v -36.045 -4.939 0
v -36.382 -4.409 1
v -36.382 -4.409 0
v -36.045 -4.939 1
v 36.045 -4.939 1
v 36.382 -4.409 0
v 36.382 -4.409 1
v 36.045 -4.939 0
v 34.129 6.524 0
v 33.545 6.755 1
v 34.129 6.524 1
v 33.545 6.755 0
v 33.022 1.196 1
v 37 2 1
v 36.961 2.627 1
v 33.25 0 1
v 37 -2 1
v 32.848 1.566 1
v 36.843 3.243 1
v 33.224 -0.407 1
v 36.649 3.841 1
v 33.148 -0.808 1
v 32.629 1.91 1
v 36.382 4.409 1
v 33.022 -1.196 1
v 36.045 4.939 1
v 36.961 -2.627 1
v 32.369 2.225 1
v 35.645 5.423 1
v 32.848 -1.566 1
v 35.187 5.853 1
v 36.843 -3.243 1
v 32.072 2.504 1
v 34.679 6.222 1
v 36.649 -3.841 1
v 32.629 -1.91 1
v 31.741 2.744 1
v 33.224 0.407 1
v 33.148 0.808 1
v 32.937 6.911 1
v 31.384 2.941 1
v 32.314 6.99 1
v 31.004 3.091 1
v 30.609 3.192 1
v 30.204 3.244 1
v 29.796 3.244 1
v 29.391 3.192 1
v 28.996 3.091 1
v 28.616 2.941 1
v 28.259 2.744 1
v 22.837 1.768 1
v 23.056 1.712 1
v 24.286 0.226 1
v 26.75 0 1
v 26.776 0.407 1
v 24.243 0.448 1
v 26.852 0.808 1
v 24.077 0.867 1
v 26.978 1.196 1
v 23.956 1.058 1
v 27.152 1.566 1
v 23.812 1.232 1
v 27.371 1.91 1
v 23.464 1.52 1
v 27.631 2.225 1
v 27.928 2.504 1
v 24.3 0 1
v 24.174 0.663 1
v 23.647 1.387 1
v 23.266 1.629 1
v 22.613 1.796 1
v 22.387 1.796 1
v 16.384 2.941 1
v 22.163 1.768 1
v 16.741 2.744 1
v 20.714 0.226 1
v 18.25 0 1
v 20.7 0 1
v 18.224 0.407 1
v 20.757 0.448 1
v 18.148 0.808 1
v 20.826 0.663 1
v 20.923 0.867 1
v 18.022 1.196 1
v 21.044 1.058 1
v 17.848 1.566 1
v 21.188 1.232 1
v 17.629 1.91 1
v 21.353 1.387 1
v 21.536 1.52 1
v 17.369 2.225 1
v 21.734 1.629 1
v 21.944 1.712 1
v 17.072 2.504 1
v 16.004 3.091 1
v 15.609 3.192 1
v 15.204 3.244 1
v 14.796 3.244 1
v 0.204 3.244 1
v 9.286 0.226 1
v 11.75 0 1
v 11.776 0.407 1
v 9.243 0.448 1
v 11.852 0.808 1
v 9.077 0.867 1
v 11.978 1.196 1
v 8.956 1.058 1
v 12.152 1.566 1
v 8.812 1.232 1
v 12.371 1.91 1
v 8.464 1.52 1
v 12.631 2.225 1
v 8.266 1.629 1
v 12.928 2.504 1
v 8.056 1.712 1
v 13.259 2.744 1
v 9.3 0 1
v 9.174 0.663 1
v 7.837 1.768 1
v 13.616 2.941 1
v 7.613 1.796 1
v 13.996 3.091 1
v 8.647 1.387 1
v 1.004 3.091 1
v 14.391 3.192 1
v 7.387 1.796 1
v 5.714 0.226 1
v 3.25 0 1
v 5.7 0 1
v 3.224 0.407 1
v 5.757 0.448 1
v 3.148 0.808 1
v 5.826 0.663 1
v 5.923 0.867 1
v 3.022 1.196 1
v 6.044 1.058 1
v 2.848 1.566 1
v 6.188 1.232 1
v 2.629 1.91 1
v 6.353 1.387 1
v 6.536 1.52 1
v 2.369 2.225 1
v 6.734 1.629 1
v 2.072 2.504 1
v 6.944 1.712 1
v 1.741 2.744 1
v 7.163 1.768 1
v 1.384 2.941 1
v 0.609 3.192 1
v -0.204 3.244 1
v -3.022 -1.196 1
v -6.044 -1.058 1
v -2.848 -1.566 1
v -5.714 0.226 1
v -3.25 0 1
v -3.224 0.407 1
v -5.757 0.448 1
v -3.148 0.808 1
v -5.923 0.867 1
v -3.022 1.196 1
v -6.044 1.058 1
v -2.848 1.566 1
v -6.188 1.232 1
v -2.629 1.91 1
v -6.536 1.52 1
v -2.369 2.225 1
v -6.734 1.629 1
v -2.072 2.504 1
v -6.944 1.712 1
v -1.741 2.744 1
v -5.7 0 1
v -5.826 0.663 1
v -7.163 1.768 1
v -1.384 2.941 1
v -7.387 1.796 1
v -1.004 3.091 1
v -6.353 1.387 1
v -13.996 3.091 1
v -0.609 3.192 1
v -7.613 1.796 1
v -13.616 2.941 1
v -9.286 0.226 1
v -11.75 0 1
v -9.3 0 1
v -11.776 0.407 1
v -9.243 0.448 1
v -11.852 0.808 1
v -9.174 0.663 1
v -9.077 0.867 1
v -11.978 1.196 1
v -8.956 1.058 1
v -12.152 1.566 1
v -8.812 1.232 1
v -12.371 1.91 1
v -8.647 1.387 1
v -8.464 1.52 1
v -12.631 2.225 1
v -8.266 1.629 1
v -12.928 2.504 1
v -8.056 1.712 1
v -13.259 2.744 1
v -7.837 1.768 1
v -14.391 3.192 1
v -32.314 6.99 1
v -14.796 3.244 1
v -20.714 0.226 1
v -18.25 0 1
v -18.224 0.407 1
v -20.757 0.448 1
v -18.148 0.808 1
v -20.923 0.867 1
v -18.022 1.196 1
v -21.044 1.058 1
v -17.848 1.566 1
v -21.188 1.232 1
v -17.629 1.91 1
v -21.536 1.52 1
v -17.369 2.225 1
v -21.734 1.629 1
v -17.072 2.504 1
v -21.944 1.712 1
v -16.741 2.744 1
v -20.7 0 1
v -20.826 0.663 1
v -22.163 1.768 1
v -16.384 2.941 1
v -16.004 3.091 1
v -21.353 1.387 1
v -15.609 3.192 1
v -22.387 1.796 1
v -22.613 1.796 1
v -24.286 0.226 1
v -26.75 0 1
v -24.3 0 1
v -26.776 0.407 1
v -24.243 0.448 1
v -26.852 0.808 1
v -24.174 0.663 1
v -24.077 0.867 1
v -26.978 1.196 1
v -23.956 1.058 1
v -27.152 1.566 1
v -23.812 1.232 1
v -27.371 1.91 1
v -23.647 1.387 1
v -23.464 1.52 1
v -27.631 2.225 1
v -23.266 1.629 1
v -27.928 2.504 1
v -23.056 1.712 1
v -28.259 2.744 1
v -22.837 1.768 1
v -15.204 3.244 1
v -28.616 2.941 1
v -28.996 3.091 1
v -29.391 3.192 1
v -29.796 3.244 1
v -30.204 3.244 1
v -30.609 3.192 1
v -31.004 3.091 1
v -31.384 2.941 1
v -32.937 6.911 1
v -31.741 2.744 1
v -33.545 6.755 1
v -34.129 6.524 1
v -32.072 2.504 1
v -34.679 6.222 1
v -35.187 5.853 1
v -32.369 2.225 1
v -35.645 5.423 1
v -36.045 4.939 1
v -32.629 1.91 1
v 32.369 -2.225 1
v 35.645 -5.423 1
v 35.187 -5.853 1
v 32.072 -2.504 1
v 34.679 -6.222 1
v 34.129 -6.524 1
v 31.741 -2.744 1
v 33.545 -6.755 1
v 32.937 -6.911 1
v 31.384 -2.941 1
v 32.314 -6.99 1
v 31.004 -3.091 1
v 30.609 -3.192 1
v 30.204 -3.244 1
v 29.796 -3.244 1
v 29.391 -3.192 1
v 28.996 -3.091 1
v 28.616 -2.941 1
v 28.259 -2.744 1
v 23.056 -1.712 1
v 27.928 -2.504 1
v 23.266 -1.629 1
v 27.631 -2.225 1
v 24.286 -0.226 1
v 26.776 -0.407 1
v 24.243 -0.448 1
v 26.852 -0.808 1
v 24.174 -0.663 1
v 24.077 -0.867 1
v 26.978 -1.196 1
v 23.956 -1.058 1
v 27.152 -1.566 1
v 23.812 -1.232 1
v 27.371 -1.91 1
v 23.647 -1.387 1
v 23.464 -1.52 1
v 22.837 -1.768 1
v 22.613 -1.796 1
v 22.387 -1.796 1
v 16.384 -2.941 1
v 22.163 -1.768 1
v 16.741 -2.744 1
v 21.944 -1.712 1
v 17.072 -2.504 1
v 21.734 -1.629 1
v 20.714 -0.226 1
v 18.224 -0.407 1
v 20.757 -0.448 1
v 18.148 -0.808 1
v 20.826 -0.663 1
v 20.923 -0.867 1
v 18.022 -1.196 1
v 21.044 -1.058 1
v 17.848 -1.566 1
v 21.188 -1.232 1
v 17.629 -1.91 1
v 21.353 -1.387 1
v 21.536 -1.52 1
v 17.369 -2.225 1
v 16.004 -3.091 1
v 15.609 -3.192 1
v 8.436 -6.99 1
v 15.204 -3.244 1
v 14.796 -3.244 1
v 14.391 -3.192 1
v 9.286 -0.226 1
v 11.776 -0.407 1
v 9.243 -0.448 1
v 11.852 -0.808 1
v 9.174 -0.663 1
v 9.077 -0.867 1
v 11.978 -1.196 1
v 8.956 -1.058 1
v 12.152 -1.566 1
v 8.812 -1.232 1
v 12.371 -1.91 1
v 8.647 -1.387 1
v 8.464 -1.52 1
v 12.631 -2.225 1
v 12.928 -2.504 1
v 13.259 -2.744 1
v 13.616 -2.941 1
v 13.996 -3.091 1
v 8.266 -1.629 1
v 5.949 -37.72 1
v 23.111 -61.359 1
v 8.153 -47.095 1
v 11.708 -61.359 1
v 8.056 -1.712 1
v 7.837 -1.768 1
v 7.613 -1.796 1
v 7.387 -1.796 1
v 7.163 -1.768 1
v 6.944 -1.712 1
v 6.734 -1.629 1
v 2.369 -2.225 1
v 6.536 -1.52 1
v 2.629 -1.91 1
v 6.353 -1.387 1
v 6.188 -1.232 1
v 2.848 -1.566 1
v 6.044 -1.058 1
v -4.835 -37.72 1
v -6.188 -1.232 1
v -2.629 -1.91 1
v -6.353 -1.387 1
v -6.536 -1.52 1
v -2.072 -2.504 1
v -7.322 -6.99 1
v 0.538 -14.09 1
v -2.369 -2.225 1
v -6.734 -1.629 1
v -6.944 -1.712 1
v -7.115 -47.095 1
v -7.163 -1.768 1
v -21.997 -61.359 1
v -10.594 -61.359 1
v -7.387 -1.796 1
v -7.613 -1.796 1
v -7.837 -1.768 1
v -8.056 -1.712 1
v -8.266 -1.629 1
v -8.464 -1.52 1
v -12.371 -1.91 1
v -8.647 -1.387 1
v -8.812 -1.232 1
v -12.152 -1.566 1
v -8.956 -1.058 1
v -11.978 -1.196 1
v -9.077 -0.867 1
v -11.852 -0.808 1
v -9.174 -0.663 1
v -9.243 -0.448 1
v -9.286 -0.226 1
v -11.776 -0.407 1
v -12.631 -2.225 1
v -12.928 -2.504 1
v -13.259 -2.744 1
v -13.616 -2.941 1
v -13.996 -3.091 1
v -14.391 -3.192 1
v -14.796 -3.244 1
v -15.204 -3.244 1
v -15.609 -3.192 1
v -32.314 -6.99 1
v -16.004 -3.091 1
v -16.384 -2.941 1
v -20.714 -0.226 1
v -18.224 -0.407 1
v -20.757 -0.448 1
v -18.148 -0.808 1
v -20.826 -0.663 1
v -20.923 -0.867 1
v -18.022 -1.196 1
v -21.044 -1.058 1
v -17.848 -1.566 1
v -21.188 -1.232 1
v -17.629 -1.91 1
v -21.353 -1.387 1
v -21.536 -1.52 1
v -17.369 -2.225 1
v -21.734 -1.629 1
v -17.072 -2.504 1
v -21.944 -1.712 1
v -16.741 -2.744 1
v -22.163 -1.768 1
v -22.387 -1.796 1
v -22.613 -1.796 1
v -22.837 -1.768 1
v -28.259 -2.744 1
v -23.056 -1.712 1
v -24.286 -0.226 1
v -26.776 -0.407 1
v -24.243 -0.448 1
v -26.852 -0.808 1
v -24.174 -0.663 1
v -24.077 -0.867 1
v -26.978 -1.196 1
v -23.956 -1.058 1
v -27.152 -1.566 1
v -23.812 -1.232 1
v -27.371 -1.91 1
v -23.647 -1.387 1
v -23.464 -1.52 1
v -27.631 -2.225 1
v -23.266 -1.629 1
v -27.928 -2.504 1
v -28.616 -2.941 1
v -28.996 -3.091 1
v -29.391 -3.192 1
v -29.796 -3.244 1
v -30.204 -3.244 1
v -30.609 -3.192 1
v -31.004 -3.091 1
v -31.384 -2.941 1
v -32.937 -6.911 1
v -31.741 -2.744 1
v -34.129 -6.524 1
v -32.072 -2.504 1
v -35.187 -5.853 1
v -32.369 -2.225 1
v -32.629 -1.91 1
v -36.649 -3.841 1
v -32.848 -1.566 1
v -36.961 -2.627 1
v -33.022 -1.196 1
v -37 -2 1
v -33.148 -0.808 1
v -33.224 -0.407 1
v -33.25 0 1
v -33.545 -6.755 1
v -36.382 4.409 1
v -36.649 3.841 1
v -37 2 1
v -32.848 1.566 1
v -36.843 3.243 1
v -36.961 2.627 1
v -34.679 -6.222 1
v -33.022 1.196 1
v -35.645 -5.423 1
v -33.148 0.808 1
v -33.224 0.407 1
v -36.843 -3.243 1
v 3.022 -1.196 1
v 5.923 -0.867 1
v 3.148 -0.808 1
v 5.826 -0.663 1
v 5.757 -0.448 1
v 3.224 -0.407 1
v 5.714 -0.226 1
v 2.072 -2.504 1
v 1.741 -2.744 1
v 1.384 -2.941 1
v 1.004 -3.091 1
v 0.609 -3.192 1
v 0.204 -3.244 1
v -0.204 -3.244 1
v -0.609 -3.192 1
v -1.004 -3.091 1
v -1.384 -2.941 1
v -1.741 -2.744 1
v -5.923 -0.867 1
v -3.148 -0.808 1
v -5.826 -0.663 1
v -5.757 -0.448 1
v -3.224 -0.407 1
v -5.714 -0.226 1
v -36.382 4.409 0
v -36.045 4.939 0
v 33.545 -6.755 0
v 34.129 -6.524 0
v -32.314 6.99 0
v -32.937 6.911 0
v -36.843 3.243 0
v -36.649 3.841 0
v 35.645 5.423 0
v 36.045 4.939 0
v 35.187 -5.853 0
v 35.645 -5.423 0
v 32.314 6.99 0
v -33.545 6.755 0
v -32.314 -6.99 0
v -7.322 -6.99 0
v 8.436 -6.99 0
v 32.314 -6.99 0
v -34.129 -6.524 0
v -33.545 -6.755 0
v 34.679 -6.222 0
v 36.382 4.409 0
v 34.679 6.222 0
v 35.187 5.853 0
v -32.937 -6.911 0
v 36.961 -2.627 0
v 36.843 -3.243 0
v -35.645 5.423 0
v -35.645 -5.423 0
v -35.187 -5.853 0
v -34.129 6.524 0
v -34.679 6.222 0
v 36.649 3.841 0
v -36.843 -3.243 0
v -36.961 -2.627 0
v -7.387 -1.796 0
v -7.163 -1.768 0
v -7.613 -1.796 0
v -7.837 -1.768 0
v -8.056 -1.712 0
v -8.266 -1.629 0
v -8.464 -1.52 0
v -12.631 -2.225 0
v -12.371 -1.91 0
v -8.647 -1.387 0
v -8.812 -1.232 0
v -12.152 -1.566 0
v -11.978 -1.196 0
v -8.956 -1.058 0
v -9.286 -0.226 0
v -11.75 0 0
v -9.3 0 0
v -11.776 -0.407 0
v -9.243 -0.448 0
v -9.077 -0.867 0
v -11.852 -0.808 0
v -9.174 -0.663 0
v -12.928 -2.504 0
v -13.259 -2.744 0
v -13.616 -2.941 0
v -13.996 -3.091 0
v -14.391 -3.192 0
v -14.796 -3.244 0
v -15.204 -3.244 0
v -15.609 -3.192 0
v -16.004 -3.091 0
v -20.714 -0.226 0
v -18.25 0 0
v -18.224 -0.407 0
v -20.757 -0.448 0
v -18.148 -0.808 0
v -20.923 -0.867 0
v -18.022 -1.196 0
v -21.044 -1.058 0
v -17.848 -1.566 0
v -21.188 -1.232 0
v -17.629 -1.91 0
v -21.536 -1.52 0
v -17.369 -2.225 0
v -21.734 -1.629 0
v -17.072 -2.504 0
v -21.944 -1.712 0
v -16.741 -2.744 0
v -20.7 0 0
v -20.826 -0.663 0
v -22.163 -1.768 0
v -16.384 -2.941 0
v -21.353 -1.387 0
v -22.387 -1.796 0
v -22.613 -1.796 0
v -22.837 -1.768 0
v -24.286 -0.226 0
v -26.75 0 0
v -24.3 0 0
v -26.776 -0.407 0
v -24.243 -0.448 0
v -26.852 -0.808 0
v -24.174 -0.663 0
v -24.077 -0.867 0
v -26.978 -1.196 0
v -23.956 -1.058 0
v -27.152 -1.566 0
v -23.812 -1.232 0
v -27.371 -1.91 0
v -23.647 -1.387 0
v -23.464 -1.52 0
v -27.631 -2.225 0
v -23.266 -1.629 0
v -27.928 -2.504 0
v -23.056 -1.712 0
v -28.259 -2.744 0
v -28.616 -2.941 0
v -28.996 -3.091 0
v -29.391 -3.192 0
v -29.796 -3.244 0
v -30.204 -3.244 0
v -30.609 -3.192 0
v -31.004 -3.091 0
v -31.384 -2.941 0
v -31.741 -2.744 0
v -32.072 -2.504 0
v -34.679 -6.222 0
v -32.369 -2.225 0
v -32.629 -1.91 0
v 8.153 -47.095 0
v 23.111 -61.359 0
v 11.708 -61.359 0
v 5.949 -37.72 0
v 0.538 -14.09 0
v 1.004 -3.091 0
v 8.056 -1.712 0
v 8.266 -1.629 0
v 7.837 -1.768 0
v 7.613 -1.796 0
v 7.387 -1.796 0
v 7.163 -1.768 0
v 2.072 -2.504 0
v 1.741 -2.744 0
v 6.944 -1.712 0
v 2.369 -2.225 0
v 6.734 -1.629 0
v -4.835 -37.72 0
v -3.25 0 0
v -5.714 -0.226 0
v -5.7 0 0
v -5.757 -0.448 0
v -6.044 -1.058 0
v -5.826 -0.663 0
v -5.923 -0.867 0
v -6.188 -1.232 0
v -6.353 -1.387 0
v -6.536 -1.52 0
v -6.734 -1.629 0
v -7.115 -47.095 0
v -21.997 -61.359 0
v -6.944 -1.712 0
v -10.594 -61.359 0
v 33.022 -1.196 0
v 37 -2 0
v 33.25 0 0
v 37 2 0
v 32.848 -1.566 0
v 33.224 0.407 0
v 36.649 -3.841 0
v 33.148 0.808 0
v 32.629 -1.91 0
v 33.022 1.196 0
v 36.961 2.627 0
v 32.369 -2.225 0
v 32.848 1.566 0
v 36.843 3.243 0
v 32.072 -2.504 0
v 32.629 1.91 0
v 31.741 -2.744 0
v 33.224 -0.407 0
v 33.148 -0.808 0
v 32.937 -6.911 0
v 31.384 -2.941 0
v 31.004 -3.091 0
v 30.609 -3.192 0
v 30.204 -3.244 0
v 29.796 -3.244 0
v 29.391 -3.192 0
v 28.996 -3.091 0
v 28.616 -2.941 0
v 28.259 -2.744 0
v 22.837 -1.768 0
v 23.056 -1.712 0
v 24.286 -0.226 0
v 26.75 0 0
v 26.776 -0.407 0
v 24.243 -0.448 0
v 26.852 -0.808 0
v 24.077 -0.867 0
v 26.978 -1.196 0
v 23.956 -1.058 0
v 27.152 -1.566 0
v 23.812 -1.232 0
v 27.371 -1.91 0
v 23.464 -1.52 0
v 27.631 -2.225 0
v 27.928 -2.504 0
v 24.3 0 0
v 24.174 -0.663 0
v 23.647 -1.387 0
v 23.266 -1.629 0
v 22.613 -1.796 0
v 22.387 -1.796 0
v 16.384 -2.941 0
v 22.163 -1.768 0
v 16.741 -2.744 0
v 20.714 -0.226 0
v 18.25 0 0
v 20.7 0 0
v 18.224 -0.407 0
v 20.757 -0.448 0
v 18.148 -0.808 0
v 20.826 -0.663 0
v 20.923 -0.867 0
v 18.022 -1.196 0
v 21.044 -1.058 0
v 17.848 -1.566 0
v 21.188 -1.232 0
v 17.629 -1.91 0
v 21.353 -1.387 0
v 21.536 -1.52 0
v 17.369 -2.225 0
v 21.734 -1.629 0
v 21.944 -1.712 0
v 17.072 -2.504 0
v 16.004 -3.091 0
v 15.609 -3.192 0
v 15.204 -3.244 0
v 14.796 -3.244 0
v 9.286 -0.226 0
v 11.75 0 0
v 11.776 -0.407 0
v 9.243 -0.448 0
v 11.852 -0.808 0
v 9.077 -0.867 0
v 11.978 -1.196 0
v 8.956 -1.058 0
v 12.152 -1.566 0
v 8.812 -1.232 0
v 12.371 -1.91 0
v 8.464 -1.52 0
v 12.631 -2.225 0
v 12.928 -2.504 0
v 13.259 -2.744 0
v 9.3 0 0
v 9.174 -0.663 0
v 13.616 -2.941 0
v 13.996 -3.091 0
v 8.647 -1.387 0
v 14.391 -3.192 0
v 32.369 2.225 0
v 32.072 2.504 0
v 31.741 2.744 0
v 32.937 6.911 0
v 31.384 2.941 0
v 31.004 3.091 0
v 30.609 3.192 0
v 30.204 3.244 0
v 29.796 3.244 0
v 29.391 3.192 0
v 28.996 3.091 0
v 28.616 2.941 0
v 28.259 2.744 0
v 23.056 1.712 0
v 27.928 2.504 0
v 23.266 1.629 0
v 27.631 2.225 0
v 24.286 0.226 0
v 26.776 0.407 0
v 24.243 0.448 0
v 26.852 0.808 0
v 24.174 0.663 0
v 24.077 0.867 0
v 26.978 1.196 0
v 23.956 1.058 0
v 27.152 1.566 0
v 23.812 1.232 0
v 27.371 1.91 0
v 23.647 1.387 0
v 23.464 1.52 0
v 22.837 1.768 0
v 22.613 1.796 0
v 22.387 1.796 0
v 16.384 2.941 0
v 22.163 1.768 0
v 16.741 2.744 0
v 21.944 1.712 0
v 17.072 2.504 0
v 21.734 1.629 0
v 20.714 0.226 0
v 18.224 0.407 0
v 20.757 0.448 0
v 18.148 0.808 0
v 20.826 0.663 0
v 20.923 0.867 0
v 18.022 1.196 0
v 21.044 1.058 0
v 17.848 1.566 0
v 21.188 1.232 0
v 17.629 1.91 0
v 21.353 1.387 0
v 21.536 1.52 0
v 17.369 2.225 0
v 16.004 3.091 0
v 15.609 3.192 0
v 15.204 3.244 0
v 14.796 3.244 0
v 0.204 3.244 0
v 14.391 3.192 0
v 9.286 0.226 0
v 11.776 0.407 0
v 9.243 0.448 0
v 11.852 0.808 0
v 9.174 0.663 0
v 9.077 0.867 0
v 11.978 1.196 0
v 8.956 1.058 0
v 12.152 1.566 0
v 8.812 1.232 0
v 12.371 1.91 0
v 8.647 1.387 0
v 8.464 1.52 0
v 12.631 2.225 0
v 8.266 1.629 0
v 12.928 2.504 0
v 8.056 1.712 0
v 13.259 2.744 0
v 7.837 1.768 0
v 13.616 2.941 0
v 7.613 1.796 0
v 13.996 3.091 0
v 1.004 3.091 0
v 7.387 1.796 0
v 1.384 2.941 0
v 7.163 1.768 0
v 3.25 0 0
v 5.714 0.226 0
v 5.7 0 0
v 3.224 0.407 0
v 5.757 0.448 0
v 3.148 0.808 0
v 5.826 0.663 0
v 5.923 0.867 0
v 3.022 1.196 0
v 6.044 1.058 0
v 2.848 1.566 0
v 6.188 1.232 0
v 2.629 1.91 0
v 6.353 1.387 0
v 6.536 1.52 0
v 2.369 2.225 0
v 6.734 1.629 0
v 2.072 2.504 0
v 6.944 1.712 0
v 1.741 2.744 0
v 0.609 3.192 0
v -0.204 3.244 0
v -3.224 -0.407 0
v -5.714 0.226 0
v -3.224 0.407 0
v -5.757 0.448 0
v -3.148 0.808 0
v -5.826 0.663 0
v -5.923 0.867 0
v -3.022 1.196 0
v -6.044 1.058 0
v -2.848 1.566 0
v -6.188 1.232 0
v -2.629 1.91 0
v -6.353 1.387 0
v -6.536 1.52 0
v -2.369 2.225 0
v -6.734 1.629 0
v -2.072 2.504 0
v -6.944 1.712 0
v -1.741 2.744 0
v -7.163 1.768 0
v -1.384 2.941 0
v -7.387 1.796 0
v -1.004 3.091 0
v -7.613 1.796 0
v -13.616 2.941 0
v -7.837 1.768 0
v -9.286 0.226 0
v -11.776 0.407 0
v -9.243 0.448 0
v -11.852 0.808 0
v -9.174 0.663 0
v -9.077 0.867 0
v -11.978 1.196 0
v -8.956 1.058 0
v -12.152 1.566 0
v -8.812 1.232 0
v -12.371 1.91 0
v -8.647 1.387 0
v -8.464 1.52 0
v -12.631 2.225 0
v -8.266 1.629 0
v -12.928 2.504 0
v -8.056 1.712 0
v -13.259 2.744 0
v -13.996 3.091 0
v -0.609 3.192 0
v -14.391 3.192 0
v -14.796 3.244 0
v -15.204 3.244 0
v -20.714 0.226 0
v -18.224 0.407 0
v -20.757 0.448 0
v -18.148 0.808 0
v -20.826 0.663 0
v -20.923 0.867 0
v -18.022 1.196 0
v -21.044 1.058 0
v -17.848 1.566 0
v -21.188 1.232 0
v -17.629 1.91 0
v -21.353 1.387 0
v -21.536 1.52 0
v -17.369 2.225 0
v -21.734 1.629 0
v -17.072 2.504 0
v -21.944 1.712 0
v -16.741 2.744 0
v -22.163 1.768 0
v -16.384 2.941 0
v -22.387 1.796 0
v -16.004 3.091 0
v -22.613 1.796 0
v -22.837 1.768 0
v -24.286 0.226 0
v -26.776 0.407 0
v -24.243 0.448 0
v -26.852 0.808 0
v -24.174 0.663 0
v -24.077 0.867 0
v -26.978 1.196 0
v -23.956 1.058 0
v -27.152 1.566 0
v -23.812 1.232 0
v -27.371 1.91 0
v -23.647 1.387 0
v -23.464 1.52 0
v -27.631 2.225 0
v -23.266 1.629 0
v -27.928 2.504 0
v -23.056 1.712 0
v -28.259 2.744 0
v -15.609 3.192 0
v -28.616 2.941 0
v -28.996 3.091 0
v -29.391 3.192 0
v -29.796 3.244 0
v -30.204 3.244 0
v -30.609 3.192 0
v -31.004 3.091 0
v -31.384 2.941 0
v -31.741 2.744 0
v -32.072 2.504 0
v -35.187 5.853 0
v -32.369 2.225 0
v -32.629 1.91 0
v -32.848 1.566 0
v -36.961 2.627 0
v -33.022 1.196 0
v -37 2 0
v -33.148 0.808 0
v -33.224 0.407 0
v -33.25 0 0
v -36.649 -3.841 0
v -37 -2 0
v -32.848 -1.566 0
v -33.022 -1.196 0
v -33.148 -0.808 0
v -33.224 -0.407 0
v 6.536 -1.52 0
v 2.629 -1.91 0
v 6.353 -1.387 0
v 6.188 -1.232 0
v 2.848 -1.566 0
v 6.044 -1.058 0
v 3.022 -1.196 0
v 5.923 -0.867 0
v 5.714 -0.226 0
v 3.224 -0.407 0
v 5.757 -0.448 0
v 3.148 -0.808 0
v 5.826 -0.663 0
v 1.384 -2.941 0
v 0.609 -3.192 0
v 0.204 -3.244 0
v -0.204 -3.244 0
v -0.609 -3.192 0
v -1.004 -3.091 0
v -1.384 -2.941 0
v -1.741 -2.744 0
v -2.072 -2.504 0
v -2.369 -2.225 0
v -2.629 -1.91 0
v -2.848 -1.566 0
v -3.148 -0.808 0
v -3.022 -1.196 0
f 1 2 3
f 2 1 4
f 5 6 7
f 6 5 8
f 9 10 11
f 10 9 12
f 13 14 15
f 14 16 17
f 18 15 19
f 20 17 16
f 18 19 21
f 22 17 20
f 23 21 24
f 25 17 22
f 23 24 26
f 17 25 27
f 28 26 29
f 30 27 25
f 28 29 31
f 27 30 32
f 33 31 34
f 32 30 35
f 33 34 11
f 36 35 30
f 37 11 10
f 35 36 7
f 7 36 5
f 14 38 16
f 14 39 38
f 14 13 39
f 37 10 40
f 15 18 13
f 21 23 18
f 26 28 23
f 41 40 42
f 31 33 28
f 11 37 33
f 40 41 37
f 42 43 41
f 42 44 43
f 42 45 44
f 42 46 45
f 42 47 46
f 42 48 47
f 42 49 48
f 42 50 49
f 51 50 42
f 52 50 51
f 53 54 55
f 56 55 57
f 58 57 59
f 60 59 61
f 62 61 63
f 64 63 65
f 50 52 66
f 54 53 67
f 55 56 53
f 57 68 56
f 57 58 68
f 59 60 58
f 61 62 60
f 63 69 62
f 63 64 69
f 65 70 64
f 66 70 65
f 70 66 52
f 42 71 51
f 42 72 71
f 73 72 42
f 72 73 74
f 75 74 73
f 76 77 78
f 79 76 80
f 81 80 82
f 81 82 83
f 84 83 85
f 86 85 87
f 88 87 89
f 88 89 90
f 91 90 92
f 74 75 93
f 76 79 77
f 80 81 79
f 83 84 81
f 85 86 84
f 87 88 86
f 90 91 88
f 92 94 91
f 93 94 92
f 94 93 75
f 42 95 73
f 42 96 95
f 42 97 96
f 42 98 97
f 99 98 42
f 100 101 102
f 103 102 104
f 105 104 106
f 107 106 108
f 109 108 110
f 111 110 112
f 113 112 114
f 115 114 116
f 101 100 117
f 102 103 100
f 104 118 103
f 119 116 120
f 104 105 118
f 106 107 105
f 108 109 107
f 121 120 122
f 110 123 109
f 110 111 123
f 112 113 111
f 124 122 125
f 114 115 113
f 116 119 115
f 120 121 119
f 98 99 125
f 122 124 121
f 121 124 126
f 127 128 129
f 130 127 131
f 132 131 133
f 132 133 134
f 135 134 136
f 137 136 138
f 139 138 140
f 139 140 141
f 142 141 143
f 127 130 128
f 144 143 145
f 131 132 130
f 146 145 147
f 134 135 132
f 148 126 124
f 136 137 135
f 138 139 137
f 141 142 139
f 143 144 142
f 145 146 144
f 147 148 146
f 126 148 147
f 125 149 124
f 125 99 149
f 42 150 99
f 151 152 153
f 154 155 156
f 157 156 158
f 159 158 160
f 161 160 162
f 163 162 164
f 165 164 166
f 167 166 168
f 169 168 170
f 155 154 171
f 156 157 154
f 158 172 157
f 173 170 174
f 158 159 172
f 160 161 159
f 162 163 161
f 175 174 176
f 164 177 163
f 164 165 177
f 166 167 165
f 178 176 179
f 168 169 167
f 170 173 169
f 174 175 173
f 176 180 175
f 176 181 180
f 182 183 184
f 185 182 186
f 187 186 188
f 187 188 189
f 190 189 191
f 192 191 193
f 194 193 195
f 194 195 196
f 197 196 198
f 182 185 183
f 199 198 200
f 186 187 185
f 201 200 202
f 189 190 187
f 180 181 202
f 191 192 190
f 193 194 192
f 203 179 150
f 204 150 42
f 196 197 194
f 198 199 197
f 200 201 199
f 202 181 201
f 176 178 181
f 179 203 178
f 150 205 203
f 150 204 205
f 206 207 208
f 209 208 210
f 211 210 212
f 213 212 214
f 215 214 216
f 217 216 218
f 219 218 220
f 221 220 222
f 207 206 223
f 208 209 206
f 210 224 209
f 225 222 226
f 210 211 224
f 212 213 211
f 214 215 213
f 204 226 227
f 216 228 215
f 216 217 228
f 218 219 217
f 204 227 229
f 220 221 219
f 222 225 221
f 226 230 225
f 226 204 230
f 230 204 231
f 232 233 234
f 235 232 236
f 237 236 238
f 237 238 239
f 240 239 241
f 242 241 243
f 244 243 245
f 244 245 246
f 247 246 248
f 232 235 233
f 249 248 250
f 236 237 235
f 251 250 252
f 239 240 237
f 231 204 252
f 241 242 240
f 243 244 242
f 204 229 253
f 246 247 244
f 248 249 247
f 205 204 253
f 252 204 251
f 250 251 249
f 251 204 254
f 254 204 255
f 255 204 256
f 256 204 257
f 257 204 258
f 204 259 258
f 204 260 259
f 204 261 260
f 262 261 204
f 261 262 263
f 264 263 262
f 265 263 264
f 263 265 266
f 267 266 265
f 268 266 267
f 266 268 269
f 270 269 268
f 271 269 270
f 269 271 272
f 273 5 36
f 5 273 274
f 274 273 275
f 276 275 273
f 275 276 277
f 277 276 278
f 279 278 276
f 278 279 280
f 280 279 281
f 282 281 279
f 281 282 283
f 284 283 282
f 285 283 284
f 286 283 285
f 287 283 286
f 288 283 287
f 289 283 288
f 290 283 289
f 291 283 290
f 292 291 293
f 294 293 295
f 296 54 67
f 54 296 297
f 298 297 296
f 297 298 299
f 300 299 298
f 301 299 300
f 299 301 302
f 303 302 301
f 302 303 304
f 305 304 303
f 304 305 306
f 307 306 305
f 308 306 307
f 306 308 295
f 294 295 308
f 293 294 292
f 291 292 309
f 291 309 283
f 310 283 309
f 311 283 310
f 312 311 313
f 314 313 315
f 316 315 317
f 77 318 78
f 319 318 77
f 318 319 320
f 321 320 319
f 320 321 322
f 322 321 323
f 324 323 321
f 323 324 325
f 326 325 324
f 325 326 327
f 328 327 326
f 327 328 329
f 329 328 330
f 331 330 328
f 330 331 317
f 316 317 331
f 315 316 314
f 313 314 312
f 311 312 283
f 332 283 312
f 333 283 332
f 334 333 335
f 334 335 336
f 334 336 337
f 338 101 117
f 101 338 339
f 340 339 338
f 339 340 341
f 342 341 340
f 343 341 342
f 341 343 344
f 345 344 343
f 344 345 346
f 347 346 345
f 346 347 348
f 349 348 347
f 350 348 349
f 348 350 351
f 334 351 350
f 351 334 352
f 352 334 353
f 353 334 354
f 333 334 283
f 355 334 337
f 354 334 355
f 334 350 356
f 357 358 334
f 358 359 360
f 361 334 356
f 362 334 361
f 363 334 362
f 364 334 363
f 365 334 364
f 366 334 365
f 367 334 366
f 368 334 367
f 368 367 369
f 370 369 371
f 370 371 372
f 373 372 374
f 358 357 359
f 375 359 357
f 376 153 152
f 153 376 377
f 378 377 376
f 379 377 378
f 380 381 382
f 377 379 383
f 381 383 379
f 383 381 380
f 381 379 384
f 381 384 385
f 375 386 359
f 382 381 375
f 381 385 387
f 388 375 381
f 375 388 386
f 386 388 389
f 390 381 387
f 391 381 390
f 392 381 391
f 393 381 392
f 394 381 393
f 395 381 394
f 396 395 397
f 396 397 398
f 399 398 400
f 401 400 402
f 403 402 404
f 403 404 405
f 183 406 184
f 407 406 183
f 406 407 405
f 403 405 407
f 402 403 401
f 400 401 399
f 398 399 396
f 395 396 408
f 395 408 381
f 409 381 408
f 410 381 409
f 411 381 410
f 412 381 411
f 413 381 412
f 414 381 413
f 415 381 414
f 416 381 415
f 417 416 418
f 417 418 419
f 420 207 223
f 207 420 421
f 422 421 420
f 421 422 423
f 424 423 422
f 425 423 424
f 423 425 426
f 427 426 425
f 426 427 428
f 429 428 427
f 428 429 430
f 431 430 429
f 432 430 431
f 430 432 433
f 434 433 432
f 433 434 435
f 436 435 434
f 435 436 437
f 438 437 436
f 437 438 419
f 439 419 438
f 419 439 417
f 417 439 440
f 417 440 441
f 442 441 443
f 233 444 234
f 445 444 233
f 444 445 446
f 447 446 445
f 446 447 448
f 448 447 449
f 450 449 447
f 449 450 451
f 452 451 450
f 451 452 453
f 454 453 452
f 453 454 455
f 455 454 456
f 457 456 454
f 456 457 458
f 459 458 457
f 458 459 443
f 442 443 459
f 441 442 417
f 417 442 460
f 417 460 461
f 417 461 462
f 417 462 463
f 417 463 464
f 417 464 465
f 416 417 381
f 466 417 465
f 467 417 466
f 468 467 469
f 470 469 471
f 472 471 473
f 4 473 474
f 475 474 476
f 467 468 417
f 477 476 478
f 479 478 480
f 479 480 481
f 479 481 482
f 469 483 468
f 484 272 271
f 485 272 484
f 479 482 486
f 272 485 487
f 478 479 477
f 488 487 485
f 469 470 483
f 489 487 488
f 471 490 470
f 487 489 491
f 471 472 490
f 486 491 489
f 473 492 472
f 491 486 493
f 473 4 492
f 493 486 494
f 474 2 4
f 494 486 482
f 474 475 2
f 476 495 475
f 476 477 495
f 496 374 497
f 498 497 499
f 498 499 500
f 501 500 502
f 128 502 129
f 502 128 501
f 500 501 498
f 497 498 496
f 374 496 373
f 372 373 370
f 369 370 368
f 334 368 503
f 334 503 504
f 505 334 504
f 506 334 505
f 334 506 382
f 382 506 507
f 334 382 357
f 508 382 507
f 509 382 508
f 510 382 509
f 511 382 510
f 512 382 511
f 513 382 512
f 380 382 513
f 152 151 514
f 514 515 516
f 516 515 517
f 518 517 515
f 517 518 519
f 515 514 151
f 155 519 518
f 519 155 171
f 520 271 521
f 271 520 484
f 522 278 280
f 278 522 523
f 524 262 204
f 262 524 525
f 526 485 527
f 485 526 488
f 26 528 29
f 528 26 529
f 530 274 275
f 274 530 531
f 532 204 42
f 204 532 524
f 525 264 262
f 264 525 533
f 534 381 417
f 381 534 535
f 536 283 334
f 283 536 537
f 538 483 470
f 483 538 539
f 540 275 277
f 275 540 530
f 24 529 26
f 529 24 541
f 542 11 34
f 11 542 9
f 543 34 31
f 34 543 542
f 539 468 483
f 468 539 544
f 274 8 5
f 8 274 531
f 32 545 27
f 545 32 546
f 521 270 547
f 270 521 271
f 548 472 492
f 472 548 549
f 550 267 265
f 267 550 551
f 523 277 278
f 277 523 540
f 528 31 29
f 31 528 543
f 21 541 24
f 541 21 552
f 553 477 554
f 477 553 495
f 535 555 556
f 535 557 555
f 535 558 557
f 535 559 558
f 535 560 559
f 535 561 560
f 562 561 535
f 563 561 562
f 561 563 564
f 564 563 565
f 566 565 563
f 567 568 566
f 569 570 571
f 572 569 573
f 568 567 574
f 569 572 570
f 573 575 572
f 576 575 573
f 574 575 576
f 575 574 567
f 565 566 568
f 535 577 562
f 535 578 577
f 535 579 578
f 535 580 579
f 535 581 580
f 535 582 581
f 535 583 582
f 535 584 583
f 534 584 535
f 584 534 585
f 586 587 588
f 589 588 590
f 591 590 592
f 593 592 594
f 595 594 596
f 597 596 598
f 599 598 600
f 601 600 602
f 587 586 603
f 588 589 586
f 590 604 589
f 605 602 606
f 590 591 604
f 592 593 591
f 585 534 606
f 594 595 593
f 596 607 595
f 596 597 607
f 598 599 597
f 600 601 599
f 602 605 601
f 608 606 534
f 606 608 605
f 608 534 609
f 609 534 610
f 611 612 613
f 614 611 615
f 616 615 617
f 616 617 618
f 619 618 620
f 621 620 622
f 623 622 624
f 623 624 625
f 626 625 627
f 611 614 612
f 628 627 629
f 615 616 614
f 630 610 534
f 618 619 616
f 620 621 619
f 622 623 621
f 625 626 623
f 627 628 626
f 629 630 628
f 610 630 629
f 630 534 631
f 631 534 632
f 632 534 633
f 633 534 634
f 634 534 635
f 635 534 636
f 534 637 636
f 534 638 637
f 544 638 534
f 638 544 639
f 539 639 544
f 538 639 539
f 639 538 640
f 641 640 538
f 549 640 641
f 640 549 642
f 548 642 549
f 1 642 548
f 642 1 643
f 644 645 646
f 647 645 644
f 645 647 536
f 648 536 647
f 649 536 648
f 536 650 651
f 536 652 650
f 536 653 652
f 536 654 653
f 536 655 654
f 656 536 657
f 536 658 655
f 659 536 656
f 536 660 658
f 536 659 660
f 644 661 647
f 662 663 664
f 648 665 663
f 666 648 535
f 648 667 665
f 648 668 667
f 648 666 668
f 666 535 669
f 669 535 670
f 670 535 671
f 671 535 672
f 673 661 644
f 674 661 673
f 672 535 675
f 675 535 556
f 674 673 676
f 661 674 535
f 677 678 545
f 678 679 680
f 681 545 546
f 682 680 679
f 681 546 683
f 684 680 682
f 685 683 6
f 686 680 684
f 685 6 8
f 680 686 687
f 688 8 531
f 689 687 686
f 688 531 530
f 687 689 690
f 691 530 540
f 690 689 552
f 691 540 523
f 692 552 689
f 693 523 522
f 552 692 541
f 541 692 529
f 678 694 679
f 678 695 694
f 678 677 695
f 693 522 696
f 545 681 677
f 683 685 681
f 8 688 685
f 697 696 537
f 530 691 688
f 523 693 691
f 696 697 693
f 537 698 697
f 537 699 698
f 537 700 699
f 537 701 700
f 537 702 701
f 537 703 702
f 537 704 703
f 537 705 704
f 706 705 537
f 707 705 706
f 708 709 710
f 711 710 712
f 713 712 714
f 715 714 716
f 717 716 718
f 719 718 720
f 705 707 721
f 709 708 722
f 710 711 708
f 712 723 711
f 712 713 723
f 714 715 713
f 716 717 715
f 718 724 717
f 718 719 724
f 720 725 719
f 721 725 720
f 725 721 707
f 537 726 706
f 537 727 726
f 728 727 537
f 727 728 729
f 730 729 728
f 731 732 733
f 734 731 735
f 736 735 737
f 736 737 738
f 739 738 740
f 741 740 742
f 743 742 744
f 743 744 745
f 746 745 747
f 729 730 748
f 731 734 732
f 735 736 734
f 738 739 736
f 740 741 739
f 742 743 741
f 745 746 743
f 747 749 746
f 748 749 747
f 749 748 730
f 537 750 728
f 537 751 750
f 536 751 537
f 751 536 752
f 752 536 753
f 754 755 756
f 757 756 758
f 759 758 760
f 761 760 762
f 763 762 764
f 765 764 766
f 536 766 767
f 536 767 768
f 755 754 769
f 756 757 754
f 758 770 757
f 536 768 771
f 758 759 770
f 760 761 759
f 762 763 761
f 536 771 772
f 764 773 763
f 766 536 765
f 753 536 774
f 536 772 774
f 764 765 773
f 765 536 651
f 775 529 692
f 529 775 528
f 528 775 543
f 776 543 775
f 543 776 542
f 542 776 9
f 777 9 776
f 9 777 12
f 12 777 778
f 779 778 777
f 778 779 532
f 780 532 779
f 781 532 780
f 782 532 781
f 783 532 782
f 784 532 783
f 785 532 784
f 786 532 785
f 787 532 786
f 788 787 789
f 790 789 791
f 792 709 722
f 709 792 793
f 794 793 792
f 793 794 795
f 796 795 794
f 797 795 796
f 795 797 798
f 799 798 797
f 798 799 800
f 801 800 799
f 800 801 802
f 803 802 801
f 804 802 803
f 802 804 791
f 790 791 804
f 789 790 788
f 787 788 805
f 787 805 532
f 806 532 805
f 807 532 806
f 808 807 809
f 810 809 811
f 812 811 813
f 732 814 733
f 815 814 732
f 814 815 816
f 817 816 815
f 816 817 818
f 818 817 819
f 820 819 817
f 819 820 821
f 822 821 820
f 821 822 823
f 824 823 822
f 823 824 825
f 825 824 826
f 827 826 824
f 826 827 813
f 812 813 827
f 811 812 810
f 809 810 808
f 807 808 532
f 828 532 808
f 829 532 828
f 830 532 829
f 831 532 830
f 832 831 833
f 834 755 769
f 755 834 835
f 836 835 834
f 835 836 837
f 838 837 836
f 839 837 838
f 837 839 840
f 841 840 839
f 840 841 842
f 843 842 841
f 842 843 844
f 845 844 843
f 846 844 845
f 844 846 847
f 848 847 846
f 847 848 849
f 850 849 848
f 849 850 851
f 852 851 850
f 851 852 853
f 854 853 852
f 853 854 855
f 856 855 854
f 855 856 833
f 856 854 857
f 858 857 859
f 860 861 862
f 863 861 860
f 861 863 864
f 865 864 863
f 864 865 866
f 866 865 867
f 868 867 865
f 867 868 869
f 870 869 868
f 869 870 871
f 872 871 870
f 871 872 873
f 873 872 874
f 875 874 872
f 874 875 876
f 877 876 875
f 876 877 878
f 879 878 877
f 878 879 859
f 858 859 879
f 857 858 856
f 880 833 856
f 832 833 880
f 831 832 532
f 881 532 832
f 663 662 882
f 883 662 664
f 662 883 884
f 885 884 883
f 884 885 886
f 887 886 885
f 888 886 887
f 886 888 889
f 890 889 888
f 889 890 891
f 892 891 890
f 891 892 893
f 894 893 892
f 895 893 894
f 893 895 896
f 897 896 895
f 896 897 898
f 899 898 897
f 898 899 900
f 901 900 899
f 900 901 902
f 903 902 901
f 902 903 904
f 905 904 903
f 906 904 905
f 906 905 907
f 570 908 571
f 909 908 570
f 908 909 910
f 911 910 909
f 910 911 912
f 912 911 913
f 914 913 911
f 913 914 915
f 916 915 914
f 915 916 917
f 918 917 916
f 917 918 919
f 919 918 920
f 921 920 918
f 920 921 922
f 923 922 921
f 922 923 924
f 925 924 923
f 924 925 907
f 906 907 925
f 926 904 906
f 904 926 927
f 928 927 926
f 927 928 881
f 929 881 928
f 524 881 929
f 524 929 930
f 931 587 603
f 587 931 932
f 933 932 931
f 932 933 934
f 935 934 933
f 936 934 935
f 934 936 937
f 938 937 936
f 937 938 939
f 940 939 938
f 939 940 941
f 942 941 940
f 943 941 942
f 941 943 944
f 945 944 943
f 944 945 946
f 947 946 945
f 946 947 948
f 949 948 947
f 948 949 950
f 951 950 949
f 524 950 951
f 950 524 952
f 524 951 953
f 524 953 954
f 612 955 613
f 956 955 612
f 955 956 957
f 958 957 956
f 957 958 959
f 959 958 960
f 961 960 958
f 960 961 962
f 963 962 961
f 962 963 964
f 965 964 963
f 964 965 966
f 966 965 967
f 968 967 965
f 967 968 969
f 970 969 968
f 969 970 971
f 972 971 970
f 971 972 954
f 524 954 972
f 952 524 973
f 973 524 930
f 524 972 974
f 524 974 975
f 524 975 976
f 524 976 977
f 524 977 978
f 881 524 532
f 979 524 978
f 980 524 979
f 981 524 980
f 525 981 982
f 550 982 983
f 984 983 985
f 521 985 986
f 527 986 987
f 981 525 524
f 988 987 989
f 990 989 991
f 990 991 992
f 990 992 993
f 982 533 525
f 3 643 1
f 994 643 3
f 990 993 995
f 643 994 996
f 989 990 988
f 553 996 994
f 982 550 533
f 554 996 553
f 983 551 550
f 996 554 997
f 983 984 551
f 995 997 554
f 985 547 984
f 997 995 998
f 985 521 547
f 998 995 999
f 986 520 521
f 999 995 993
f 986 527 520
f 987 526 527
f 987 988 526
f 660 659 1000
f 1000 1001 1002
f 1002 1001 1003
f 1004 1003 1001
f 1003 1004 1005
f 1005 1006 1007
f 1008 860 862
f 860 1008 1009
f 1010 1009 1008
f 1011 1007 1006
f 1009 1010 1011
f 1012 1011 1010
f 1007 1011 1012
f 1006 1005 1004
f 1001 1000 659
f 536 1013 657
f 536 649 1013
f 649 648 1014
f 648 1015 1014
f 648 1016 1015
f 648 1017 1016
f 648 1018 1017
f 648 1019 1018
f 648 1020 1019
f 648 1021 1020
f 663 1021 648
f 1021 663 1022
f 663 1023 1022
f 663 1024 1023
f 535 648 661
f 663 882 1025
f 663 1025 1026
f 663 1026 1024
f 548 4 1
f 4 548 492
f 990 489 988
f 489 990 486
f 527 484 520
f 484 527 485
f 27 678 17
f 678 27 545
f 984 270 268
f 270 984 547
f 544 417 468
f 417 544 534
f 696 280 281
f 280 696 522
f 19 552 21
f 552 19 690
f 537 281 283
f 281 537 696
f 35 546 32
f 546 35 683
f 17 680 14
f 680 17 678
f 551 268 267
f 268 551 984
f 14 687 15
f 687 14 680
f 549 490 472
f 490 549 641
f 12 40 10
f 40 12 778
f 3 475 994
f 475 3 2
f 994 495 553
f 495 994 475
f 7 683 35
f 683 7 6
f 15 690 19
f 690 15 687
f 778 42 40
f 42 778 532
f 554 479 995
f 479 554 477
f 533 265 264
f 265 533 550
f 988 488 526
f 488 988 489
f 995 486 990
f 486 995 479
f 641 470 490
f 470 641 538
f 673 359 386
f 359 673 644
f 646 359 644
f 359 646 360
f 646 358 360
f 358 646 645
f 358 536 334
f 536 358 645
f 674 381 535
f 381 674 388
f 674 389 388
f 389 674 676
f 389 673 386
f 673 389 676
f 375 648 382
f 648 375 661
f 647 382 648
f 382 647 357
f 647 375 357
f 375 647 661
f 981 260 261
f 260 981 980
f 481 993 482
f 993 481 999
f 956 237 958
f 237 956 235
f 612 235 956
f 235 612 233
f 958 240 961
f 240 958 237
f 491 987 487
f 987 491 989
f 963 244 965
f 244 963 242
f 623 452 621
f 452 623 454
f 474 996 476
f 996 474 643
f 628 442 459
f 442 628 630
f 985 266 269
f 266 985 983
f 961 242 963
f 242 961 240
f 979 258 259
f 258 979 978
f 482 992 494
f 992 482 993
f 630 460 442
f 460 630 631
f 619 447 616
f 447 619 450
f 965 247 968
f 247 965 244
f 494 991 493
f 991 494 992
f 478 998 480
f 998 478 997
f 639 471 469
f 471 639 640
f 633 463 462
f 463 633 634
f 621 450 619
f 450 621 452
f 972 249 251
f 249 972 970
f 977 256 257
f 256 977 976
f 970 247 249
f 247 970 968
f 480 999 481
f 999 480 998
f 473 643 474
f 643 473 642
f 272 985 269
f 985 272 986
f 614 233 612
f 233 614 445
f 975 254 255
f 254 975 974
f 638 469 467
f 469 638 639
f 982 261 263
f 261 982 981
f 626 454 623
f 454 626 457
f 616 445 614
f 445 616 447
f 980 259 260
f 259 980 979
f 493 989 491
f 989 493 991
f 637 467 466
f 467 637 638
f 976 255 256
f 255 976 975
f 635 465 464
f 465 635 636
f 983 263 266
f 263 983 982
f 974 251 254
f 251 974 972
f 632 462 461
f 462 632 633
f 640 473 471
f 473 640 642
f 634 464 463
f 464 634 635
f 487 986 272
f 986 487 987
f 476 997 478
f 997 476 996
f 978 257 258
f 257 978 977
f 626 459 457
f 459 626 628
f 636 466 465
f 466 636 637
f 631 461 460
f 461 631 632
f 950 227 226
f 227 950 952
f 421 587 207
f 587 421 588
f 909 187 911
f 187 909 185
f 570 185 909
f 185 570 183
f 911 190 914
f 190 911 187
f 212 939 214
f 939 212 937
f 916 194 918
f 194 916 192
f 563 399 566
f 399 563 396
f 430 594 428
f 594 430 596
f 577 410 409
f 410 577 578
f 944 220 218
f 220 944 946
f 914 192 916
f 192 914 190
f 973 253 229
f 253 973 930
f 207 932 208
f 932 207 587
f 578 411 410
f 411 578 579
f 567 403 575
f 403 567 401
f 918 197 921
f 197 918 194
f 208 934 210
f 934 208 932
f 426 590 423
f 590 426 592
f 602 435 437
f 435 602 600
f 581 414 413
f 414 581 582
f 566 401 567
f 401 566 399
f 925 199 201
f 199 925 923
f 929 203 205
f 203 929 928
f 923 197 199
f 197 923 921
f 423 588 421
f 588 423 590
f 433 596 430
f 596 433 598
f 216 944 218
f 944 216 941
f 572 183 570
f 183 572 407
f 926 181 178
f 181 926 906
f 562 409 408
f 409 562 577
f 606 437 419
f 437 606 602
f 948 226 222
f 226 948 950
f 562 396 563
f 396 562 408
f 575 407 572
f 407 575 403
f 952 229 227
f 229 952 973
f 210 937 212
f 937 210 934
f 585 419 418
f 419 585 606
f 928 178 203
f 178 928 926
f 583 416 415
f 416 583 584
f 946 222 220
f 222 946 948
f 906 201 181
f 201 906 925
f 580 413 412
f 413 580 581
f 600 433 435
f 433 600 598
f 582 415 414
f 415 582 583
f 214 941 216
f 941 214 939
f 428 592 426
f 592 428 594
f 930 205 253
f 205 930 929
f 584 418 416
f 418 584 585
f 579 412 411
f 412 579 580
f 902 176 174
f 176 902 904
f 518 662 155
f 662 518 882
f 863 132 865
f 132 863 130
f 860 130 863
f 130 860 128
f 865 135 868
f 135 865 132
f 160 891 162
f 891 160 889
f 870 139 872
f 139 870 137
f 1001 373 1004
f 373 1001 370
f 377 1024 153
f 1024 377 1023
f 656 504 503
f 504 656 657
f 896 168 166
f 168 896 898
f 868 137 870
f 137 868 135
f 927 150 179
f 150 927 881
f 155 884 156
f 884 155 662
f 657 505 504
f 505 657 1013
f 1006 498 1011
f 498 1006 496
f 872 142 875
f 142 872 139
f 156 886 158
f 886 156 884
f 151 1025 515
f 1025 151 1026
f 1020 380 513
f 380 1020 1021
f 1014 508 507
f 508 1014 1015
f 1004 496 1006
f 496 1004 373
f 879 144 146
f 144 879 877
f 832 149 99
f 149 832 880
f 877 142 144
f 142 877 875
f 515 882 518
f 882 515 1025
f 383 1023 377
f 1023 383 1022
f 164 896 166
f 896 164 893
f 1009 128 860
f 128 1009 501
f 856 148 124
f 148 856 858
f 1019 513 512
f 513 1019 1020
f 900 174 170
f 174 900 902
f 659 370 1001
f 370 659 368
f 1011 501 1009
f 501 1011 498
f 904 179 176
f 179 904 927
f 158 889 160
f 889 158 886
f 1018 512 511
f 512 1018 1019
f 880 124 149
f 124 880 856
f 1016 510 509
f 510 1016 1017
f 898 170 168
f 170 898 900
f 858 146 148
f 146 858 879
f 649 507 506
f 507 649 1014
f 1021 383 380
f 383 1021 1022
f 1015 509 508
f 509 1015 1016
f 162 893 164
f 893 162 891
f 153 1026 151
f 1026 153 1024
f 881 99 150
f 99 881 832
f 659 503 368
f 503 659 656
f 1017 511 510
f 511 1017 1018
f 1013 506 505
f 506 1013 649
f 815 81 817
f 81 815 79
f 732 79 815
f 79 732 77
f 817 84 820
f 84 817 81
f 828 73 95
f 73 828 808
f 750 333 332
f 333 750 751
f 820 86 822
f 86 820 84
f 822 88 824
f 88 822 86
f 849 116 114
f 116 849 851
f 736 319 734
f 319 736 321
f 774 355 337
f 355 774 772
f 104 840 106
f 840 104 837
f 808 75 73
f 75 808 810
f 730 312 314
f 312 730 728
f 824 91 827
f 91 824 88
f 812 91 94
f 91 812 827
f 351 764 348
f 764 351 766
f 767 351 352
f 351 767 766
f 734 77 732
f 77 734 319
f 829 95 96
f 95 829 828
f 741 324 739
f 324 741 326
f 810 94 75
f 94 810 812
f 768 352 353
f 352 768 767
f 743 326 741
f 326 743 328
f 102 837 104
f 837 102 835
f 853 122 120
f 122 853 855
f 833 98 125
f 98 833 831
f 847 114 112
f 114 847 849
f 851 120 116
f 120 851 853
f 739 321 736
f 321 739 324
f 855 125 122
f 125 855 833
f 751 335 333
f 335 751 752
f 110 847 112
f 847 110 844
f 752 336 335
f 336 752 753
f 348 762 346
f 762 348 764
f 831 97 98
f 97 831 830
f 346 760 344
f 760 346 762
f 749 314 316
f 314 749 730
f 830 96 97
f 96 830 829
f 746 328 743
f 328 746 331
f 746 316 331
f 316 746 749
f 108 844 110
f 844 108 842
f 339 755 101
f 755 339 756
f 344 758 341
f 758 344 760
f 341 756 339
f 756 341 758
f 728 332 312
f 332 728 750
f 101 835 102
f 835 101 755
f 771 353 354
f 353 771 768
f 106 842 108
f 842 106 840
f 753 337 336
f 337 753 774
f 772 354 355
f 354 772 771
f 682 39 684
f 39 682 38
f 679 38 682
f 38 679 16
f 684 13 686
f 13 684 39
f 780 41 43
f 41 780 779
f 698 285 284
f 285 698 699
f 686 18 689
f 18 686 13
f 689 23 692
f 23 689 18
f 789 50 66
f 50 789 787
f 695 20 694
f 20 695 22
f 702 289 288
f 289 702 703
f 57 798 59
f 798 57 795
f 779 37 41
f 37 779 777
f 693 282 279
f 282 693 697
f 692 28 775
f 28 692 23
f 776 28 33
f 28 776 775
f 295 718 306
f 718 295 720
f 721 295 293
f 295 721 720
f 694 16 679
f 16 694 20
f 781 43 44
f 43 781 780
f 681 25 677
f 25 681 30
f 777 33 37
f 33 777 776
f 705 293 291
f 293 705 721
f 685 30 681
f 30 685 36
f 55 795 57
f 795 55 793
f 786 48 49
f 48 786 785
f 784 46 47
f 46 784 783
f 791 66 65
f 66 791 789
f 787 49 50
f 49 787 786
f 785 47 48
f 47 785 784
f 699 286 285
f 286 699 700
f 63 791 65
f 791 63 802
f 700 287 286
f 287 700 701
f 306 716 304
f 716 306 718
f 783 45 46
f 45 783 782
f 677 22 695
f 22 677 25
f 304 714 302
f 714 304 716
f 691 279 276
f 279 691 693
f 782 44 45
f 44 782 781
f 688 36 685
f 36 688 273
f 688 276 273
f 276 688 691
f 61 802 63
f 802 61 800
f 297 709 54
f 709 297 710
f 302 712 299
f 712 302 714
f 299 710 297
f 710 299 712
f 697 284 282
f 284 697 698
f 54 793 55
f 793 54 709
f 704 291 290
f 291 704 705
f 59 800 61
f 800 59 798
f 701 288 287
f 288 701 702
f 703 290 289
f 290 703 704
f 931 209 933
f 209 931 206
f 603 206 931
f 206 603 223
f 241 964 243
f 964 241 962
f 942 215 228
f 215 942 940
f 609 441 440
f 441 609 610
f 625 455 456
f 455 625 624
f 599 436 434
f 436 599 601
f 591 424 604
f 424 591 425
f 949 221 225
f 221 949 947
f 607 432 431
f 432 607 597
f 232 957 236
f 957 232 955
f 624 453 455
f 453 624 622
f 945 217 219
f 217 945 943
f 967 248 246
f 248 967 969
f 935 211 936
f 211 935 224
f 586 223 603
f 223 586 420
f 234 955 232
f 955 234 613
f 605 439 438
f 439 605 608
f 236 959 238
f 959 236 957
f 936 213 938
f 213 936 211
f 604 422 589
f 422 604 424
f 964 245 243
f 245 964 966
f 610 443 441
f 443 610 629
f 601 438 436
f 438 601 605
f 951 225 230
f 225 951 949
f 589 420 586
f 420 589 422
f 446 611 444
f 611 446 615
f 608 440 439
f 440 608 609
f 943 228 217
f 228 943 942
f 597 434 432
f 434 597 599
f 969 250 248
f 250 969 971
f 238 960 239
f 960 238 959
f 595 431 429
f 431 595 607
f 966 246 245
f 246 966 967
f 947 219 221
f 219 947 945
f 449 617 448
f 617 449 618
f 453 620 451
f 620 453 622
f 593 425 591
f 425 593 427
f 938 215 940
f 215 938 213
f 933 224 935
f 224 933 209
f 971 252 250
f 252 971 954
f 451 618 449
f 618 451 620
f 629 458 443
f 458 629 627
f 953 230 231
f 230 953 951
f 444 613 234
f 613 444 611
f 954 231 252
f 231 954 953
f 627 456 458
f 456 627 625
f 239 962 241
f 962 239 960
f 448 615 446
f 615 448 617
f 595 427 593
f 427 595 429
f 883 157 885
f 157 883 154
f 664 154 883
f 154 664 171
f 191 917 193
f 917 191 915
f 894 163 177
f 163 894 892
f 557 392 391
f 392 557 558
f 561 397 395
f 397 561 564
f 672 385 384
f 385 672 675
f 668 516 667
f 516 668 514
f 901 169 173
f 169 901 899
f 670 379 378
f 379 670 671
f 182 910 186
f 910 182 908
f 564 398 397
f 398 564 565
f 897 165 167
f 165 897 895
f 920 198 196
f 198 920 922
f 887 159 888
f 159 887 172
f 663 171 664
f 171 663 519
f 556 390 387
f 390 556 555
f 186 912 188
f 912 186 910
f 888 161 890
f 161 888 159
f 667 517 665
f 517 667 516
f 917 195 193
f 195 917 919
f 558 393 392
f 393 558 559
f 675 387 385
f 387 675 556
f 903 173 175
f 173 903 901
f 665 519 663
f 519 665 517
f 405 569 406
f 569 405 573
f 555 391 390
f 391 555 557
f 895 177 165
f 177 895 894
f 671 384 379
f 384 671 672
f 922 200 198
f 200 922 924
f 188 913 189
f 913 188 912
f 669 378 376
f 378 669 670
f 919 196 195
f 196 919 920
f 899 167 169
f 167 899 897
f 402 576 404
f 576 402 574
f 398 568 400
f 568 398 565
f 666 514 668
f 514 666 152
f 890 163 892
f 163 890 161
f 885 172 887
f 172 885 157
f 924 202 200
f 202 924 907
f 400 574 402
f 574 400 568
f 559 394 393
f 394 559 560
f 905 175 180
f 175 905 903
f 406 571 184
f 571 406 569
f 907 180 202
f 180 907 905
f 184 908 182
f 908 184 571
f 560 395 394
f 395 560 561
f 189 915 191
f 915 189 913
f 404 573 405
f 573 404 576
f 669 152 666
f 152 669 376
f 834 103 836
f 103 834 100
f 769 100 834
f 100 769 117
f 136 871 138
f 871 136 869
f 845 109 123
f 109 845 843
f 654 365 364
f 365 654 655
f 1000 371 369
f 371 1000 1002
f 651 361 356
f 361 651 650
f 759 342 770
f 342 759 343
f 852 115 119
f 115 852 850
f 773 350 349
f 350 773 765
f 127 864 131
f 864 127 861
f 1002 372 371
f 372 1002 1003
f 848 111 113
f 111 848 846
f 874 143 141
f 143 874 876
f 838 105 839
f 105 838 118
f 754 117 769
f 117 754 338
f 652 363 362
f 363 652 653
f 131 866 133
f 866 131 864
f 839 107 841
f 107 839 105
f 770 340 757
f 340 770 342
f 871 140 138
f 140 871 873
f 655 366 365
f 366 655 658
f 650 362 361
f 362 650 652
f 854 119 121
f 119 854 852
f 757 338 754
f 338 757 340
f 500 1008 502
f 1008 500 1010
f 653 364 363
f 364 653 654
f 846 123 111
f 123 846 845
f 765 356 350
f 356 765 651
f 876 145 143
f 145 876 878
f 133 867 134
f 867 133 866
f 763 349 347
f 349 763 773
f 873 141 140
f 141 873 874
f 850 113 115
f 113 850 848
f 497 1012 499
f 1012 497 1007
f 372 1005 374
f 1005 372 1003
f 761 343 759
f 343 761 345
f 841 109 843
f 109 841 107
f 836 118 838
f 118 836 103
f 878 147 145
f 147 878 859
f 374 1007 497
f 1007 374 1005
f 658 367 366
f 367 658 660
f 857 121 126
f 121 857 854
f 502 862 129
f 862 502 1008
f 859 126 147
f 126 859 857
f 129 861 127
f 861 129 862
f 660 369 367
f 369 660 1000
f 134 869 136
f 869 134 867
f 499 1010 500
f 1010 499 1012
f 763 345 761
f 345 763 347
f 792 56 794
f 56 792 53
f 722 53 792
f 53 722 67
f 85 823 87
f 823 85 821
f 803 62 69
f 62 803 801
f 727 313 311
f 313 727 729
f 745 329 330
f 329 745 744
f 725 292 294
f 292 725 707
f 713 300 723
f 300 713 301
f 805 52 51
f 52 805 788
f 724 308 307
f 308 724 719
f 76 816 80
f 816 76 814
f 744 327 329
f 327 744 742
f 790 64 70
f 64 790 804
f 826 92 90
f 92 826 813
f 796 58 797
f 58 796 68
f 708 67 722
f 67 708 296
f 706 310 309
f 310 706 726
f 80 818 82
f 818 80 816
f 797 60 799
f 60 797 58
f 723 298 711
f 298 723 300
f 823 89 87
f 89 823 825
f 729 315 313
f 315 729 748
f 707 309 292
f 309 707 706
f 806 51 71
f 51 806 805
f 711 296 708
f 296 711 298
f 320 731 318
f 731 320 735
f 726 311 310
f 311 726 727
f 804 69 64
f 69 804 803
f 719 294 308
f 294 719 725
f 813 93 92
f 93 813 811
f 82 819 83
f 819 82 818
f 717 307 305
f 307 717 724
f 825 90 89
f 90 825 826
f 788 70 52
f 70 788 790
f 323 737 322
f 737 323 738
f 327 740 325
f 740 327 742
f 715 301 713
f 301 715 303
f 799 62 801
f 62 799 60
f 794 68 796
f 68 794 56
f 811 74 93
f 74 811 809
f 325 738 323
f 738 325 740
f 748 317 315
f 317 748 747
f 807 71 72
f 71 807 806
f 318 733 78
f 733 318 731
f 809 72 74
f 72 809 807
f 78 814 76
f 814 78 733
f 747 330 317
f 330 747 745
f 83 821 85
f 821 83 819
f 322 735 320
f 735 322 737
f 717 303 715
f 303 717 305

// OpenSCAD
$fn = 50;


difference() {
	union() {
		hull() {
			translate(v = [-32.0000000000, 2.0000000000, 0]) {
				cylinder(h = 1, r = 5);
			}
			translate(v = [32.0000000000, 2.0000000000, 0]) {
				cylinder(h = 1, r = 5);
			}
			translate(v = [-32.0000000000, -2.0000000000, 0]) {
				cylinder(h = 1, r = 5);
			}
			translate(v = [32.0000000000, -2.0000000000, 0]) {
				cylinder(h = 1, r = 5);
			}
		}
		translate(v = [0, -5, 0]) {
			linear_extrude(height = 1) {
				text(font = "DejaVu Sans Mono:style=Bold", halign = "center", size = 57.0000000000, text = "A", valign = "top");
			}
		}
	}
	union() {
		translate(v = [-30.0000000000, 0.0000000000, 0]) {
			translate(v = [0, 0, -100]) {
				cylinder(h = 200, r = 3.2500000000);
			}
		}
		translate(v = [-15.0000000000, 0.0000000000, 0]) {
			translate(v = [0, 0, -100]) {
				cylinder(h = 200, r = 3.2500000000);
			}
		}
		translate(v = [0, 0, -100]) {
			cylinder(h = 200, r = 3.2500000000);
		}
		translate(v = [15.0000000000, 0.0000000000, 0]) {
			translate(v = [0, 0, -100]) {
				cylinder(h = 200, r = 3.2500000000);
			}
		}
		translate(v = [30.0000000000, 0.0000000000, 0]) {
			translate(v = [0, 0, -100]) {
				cylinder(h = 200, r = 3.2500000000);
			}
		}
		translate(v = [-30.0000000000, 0.0000000000, 0]) {
			translate(v = [0, 0, -100]) {
				cylinder(h = 200, r = 1.8000000000);
			}
		}
		translate(v = [-22.5000000000, 0.0000000000, 0]) {
			translate(v = [0, 0, -100]) {
				cylinder(h = 200, r = 1.8000000000);
			}
		}
		translate(v = [-15.0000000000, 0.0000000000, 0]) {
			translate(v = [0, 0, -100]) {
				cylinder(h = 200, r = 1.8000000000);
			}
		}
		translate(v = [-7.5000000000, 0.0000000000, 0]) {
			translate(v = [0, 0, -100]) {
				cylinder(h = 200, r = 1.8000000000);
			}
		}
		translate(v = [0, 0, -100]) {
			cylinder(h = 200, r = 1.8000000000);
		}
		translate(v = [7.5000000000, 0.0000000000, 0]) {
			translate(v = [0, 0, -100]) {
				cylinder(h = 200, r = 1.8000000000);
			}
		}
		translate(v = [15.0000000000, 0.0000000000, 0]) {
			translate(v = [0, 0, -100]) {
				cylinder(h = 200, r = 1.8000000000);
			}
		}
		translate(v = [22.5000000000, 0.0000000000, 0]) {
			translate(v = [0, 0, -100]) {
				cylinder(h = 200, r = 1.8000000000);
			}
		}
		translate(v = [30.0000000000, 0.0000000000, 0]) {
			translate(v = [0, 0, -100]) {
				cylinder(h = 200, r = 1.8000000000);
			}
		}
	}
}
